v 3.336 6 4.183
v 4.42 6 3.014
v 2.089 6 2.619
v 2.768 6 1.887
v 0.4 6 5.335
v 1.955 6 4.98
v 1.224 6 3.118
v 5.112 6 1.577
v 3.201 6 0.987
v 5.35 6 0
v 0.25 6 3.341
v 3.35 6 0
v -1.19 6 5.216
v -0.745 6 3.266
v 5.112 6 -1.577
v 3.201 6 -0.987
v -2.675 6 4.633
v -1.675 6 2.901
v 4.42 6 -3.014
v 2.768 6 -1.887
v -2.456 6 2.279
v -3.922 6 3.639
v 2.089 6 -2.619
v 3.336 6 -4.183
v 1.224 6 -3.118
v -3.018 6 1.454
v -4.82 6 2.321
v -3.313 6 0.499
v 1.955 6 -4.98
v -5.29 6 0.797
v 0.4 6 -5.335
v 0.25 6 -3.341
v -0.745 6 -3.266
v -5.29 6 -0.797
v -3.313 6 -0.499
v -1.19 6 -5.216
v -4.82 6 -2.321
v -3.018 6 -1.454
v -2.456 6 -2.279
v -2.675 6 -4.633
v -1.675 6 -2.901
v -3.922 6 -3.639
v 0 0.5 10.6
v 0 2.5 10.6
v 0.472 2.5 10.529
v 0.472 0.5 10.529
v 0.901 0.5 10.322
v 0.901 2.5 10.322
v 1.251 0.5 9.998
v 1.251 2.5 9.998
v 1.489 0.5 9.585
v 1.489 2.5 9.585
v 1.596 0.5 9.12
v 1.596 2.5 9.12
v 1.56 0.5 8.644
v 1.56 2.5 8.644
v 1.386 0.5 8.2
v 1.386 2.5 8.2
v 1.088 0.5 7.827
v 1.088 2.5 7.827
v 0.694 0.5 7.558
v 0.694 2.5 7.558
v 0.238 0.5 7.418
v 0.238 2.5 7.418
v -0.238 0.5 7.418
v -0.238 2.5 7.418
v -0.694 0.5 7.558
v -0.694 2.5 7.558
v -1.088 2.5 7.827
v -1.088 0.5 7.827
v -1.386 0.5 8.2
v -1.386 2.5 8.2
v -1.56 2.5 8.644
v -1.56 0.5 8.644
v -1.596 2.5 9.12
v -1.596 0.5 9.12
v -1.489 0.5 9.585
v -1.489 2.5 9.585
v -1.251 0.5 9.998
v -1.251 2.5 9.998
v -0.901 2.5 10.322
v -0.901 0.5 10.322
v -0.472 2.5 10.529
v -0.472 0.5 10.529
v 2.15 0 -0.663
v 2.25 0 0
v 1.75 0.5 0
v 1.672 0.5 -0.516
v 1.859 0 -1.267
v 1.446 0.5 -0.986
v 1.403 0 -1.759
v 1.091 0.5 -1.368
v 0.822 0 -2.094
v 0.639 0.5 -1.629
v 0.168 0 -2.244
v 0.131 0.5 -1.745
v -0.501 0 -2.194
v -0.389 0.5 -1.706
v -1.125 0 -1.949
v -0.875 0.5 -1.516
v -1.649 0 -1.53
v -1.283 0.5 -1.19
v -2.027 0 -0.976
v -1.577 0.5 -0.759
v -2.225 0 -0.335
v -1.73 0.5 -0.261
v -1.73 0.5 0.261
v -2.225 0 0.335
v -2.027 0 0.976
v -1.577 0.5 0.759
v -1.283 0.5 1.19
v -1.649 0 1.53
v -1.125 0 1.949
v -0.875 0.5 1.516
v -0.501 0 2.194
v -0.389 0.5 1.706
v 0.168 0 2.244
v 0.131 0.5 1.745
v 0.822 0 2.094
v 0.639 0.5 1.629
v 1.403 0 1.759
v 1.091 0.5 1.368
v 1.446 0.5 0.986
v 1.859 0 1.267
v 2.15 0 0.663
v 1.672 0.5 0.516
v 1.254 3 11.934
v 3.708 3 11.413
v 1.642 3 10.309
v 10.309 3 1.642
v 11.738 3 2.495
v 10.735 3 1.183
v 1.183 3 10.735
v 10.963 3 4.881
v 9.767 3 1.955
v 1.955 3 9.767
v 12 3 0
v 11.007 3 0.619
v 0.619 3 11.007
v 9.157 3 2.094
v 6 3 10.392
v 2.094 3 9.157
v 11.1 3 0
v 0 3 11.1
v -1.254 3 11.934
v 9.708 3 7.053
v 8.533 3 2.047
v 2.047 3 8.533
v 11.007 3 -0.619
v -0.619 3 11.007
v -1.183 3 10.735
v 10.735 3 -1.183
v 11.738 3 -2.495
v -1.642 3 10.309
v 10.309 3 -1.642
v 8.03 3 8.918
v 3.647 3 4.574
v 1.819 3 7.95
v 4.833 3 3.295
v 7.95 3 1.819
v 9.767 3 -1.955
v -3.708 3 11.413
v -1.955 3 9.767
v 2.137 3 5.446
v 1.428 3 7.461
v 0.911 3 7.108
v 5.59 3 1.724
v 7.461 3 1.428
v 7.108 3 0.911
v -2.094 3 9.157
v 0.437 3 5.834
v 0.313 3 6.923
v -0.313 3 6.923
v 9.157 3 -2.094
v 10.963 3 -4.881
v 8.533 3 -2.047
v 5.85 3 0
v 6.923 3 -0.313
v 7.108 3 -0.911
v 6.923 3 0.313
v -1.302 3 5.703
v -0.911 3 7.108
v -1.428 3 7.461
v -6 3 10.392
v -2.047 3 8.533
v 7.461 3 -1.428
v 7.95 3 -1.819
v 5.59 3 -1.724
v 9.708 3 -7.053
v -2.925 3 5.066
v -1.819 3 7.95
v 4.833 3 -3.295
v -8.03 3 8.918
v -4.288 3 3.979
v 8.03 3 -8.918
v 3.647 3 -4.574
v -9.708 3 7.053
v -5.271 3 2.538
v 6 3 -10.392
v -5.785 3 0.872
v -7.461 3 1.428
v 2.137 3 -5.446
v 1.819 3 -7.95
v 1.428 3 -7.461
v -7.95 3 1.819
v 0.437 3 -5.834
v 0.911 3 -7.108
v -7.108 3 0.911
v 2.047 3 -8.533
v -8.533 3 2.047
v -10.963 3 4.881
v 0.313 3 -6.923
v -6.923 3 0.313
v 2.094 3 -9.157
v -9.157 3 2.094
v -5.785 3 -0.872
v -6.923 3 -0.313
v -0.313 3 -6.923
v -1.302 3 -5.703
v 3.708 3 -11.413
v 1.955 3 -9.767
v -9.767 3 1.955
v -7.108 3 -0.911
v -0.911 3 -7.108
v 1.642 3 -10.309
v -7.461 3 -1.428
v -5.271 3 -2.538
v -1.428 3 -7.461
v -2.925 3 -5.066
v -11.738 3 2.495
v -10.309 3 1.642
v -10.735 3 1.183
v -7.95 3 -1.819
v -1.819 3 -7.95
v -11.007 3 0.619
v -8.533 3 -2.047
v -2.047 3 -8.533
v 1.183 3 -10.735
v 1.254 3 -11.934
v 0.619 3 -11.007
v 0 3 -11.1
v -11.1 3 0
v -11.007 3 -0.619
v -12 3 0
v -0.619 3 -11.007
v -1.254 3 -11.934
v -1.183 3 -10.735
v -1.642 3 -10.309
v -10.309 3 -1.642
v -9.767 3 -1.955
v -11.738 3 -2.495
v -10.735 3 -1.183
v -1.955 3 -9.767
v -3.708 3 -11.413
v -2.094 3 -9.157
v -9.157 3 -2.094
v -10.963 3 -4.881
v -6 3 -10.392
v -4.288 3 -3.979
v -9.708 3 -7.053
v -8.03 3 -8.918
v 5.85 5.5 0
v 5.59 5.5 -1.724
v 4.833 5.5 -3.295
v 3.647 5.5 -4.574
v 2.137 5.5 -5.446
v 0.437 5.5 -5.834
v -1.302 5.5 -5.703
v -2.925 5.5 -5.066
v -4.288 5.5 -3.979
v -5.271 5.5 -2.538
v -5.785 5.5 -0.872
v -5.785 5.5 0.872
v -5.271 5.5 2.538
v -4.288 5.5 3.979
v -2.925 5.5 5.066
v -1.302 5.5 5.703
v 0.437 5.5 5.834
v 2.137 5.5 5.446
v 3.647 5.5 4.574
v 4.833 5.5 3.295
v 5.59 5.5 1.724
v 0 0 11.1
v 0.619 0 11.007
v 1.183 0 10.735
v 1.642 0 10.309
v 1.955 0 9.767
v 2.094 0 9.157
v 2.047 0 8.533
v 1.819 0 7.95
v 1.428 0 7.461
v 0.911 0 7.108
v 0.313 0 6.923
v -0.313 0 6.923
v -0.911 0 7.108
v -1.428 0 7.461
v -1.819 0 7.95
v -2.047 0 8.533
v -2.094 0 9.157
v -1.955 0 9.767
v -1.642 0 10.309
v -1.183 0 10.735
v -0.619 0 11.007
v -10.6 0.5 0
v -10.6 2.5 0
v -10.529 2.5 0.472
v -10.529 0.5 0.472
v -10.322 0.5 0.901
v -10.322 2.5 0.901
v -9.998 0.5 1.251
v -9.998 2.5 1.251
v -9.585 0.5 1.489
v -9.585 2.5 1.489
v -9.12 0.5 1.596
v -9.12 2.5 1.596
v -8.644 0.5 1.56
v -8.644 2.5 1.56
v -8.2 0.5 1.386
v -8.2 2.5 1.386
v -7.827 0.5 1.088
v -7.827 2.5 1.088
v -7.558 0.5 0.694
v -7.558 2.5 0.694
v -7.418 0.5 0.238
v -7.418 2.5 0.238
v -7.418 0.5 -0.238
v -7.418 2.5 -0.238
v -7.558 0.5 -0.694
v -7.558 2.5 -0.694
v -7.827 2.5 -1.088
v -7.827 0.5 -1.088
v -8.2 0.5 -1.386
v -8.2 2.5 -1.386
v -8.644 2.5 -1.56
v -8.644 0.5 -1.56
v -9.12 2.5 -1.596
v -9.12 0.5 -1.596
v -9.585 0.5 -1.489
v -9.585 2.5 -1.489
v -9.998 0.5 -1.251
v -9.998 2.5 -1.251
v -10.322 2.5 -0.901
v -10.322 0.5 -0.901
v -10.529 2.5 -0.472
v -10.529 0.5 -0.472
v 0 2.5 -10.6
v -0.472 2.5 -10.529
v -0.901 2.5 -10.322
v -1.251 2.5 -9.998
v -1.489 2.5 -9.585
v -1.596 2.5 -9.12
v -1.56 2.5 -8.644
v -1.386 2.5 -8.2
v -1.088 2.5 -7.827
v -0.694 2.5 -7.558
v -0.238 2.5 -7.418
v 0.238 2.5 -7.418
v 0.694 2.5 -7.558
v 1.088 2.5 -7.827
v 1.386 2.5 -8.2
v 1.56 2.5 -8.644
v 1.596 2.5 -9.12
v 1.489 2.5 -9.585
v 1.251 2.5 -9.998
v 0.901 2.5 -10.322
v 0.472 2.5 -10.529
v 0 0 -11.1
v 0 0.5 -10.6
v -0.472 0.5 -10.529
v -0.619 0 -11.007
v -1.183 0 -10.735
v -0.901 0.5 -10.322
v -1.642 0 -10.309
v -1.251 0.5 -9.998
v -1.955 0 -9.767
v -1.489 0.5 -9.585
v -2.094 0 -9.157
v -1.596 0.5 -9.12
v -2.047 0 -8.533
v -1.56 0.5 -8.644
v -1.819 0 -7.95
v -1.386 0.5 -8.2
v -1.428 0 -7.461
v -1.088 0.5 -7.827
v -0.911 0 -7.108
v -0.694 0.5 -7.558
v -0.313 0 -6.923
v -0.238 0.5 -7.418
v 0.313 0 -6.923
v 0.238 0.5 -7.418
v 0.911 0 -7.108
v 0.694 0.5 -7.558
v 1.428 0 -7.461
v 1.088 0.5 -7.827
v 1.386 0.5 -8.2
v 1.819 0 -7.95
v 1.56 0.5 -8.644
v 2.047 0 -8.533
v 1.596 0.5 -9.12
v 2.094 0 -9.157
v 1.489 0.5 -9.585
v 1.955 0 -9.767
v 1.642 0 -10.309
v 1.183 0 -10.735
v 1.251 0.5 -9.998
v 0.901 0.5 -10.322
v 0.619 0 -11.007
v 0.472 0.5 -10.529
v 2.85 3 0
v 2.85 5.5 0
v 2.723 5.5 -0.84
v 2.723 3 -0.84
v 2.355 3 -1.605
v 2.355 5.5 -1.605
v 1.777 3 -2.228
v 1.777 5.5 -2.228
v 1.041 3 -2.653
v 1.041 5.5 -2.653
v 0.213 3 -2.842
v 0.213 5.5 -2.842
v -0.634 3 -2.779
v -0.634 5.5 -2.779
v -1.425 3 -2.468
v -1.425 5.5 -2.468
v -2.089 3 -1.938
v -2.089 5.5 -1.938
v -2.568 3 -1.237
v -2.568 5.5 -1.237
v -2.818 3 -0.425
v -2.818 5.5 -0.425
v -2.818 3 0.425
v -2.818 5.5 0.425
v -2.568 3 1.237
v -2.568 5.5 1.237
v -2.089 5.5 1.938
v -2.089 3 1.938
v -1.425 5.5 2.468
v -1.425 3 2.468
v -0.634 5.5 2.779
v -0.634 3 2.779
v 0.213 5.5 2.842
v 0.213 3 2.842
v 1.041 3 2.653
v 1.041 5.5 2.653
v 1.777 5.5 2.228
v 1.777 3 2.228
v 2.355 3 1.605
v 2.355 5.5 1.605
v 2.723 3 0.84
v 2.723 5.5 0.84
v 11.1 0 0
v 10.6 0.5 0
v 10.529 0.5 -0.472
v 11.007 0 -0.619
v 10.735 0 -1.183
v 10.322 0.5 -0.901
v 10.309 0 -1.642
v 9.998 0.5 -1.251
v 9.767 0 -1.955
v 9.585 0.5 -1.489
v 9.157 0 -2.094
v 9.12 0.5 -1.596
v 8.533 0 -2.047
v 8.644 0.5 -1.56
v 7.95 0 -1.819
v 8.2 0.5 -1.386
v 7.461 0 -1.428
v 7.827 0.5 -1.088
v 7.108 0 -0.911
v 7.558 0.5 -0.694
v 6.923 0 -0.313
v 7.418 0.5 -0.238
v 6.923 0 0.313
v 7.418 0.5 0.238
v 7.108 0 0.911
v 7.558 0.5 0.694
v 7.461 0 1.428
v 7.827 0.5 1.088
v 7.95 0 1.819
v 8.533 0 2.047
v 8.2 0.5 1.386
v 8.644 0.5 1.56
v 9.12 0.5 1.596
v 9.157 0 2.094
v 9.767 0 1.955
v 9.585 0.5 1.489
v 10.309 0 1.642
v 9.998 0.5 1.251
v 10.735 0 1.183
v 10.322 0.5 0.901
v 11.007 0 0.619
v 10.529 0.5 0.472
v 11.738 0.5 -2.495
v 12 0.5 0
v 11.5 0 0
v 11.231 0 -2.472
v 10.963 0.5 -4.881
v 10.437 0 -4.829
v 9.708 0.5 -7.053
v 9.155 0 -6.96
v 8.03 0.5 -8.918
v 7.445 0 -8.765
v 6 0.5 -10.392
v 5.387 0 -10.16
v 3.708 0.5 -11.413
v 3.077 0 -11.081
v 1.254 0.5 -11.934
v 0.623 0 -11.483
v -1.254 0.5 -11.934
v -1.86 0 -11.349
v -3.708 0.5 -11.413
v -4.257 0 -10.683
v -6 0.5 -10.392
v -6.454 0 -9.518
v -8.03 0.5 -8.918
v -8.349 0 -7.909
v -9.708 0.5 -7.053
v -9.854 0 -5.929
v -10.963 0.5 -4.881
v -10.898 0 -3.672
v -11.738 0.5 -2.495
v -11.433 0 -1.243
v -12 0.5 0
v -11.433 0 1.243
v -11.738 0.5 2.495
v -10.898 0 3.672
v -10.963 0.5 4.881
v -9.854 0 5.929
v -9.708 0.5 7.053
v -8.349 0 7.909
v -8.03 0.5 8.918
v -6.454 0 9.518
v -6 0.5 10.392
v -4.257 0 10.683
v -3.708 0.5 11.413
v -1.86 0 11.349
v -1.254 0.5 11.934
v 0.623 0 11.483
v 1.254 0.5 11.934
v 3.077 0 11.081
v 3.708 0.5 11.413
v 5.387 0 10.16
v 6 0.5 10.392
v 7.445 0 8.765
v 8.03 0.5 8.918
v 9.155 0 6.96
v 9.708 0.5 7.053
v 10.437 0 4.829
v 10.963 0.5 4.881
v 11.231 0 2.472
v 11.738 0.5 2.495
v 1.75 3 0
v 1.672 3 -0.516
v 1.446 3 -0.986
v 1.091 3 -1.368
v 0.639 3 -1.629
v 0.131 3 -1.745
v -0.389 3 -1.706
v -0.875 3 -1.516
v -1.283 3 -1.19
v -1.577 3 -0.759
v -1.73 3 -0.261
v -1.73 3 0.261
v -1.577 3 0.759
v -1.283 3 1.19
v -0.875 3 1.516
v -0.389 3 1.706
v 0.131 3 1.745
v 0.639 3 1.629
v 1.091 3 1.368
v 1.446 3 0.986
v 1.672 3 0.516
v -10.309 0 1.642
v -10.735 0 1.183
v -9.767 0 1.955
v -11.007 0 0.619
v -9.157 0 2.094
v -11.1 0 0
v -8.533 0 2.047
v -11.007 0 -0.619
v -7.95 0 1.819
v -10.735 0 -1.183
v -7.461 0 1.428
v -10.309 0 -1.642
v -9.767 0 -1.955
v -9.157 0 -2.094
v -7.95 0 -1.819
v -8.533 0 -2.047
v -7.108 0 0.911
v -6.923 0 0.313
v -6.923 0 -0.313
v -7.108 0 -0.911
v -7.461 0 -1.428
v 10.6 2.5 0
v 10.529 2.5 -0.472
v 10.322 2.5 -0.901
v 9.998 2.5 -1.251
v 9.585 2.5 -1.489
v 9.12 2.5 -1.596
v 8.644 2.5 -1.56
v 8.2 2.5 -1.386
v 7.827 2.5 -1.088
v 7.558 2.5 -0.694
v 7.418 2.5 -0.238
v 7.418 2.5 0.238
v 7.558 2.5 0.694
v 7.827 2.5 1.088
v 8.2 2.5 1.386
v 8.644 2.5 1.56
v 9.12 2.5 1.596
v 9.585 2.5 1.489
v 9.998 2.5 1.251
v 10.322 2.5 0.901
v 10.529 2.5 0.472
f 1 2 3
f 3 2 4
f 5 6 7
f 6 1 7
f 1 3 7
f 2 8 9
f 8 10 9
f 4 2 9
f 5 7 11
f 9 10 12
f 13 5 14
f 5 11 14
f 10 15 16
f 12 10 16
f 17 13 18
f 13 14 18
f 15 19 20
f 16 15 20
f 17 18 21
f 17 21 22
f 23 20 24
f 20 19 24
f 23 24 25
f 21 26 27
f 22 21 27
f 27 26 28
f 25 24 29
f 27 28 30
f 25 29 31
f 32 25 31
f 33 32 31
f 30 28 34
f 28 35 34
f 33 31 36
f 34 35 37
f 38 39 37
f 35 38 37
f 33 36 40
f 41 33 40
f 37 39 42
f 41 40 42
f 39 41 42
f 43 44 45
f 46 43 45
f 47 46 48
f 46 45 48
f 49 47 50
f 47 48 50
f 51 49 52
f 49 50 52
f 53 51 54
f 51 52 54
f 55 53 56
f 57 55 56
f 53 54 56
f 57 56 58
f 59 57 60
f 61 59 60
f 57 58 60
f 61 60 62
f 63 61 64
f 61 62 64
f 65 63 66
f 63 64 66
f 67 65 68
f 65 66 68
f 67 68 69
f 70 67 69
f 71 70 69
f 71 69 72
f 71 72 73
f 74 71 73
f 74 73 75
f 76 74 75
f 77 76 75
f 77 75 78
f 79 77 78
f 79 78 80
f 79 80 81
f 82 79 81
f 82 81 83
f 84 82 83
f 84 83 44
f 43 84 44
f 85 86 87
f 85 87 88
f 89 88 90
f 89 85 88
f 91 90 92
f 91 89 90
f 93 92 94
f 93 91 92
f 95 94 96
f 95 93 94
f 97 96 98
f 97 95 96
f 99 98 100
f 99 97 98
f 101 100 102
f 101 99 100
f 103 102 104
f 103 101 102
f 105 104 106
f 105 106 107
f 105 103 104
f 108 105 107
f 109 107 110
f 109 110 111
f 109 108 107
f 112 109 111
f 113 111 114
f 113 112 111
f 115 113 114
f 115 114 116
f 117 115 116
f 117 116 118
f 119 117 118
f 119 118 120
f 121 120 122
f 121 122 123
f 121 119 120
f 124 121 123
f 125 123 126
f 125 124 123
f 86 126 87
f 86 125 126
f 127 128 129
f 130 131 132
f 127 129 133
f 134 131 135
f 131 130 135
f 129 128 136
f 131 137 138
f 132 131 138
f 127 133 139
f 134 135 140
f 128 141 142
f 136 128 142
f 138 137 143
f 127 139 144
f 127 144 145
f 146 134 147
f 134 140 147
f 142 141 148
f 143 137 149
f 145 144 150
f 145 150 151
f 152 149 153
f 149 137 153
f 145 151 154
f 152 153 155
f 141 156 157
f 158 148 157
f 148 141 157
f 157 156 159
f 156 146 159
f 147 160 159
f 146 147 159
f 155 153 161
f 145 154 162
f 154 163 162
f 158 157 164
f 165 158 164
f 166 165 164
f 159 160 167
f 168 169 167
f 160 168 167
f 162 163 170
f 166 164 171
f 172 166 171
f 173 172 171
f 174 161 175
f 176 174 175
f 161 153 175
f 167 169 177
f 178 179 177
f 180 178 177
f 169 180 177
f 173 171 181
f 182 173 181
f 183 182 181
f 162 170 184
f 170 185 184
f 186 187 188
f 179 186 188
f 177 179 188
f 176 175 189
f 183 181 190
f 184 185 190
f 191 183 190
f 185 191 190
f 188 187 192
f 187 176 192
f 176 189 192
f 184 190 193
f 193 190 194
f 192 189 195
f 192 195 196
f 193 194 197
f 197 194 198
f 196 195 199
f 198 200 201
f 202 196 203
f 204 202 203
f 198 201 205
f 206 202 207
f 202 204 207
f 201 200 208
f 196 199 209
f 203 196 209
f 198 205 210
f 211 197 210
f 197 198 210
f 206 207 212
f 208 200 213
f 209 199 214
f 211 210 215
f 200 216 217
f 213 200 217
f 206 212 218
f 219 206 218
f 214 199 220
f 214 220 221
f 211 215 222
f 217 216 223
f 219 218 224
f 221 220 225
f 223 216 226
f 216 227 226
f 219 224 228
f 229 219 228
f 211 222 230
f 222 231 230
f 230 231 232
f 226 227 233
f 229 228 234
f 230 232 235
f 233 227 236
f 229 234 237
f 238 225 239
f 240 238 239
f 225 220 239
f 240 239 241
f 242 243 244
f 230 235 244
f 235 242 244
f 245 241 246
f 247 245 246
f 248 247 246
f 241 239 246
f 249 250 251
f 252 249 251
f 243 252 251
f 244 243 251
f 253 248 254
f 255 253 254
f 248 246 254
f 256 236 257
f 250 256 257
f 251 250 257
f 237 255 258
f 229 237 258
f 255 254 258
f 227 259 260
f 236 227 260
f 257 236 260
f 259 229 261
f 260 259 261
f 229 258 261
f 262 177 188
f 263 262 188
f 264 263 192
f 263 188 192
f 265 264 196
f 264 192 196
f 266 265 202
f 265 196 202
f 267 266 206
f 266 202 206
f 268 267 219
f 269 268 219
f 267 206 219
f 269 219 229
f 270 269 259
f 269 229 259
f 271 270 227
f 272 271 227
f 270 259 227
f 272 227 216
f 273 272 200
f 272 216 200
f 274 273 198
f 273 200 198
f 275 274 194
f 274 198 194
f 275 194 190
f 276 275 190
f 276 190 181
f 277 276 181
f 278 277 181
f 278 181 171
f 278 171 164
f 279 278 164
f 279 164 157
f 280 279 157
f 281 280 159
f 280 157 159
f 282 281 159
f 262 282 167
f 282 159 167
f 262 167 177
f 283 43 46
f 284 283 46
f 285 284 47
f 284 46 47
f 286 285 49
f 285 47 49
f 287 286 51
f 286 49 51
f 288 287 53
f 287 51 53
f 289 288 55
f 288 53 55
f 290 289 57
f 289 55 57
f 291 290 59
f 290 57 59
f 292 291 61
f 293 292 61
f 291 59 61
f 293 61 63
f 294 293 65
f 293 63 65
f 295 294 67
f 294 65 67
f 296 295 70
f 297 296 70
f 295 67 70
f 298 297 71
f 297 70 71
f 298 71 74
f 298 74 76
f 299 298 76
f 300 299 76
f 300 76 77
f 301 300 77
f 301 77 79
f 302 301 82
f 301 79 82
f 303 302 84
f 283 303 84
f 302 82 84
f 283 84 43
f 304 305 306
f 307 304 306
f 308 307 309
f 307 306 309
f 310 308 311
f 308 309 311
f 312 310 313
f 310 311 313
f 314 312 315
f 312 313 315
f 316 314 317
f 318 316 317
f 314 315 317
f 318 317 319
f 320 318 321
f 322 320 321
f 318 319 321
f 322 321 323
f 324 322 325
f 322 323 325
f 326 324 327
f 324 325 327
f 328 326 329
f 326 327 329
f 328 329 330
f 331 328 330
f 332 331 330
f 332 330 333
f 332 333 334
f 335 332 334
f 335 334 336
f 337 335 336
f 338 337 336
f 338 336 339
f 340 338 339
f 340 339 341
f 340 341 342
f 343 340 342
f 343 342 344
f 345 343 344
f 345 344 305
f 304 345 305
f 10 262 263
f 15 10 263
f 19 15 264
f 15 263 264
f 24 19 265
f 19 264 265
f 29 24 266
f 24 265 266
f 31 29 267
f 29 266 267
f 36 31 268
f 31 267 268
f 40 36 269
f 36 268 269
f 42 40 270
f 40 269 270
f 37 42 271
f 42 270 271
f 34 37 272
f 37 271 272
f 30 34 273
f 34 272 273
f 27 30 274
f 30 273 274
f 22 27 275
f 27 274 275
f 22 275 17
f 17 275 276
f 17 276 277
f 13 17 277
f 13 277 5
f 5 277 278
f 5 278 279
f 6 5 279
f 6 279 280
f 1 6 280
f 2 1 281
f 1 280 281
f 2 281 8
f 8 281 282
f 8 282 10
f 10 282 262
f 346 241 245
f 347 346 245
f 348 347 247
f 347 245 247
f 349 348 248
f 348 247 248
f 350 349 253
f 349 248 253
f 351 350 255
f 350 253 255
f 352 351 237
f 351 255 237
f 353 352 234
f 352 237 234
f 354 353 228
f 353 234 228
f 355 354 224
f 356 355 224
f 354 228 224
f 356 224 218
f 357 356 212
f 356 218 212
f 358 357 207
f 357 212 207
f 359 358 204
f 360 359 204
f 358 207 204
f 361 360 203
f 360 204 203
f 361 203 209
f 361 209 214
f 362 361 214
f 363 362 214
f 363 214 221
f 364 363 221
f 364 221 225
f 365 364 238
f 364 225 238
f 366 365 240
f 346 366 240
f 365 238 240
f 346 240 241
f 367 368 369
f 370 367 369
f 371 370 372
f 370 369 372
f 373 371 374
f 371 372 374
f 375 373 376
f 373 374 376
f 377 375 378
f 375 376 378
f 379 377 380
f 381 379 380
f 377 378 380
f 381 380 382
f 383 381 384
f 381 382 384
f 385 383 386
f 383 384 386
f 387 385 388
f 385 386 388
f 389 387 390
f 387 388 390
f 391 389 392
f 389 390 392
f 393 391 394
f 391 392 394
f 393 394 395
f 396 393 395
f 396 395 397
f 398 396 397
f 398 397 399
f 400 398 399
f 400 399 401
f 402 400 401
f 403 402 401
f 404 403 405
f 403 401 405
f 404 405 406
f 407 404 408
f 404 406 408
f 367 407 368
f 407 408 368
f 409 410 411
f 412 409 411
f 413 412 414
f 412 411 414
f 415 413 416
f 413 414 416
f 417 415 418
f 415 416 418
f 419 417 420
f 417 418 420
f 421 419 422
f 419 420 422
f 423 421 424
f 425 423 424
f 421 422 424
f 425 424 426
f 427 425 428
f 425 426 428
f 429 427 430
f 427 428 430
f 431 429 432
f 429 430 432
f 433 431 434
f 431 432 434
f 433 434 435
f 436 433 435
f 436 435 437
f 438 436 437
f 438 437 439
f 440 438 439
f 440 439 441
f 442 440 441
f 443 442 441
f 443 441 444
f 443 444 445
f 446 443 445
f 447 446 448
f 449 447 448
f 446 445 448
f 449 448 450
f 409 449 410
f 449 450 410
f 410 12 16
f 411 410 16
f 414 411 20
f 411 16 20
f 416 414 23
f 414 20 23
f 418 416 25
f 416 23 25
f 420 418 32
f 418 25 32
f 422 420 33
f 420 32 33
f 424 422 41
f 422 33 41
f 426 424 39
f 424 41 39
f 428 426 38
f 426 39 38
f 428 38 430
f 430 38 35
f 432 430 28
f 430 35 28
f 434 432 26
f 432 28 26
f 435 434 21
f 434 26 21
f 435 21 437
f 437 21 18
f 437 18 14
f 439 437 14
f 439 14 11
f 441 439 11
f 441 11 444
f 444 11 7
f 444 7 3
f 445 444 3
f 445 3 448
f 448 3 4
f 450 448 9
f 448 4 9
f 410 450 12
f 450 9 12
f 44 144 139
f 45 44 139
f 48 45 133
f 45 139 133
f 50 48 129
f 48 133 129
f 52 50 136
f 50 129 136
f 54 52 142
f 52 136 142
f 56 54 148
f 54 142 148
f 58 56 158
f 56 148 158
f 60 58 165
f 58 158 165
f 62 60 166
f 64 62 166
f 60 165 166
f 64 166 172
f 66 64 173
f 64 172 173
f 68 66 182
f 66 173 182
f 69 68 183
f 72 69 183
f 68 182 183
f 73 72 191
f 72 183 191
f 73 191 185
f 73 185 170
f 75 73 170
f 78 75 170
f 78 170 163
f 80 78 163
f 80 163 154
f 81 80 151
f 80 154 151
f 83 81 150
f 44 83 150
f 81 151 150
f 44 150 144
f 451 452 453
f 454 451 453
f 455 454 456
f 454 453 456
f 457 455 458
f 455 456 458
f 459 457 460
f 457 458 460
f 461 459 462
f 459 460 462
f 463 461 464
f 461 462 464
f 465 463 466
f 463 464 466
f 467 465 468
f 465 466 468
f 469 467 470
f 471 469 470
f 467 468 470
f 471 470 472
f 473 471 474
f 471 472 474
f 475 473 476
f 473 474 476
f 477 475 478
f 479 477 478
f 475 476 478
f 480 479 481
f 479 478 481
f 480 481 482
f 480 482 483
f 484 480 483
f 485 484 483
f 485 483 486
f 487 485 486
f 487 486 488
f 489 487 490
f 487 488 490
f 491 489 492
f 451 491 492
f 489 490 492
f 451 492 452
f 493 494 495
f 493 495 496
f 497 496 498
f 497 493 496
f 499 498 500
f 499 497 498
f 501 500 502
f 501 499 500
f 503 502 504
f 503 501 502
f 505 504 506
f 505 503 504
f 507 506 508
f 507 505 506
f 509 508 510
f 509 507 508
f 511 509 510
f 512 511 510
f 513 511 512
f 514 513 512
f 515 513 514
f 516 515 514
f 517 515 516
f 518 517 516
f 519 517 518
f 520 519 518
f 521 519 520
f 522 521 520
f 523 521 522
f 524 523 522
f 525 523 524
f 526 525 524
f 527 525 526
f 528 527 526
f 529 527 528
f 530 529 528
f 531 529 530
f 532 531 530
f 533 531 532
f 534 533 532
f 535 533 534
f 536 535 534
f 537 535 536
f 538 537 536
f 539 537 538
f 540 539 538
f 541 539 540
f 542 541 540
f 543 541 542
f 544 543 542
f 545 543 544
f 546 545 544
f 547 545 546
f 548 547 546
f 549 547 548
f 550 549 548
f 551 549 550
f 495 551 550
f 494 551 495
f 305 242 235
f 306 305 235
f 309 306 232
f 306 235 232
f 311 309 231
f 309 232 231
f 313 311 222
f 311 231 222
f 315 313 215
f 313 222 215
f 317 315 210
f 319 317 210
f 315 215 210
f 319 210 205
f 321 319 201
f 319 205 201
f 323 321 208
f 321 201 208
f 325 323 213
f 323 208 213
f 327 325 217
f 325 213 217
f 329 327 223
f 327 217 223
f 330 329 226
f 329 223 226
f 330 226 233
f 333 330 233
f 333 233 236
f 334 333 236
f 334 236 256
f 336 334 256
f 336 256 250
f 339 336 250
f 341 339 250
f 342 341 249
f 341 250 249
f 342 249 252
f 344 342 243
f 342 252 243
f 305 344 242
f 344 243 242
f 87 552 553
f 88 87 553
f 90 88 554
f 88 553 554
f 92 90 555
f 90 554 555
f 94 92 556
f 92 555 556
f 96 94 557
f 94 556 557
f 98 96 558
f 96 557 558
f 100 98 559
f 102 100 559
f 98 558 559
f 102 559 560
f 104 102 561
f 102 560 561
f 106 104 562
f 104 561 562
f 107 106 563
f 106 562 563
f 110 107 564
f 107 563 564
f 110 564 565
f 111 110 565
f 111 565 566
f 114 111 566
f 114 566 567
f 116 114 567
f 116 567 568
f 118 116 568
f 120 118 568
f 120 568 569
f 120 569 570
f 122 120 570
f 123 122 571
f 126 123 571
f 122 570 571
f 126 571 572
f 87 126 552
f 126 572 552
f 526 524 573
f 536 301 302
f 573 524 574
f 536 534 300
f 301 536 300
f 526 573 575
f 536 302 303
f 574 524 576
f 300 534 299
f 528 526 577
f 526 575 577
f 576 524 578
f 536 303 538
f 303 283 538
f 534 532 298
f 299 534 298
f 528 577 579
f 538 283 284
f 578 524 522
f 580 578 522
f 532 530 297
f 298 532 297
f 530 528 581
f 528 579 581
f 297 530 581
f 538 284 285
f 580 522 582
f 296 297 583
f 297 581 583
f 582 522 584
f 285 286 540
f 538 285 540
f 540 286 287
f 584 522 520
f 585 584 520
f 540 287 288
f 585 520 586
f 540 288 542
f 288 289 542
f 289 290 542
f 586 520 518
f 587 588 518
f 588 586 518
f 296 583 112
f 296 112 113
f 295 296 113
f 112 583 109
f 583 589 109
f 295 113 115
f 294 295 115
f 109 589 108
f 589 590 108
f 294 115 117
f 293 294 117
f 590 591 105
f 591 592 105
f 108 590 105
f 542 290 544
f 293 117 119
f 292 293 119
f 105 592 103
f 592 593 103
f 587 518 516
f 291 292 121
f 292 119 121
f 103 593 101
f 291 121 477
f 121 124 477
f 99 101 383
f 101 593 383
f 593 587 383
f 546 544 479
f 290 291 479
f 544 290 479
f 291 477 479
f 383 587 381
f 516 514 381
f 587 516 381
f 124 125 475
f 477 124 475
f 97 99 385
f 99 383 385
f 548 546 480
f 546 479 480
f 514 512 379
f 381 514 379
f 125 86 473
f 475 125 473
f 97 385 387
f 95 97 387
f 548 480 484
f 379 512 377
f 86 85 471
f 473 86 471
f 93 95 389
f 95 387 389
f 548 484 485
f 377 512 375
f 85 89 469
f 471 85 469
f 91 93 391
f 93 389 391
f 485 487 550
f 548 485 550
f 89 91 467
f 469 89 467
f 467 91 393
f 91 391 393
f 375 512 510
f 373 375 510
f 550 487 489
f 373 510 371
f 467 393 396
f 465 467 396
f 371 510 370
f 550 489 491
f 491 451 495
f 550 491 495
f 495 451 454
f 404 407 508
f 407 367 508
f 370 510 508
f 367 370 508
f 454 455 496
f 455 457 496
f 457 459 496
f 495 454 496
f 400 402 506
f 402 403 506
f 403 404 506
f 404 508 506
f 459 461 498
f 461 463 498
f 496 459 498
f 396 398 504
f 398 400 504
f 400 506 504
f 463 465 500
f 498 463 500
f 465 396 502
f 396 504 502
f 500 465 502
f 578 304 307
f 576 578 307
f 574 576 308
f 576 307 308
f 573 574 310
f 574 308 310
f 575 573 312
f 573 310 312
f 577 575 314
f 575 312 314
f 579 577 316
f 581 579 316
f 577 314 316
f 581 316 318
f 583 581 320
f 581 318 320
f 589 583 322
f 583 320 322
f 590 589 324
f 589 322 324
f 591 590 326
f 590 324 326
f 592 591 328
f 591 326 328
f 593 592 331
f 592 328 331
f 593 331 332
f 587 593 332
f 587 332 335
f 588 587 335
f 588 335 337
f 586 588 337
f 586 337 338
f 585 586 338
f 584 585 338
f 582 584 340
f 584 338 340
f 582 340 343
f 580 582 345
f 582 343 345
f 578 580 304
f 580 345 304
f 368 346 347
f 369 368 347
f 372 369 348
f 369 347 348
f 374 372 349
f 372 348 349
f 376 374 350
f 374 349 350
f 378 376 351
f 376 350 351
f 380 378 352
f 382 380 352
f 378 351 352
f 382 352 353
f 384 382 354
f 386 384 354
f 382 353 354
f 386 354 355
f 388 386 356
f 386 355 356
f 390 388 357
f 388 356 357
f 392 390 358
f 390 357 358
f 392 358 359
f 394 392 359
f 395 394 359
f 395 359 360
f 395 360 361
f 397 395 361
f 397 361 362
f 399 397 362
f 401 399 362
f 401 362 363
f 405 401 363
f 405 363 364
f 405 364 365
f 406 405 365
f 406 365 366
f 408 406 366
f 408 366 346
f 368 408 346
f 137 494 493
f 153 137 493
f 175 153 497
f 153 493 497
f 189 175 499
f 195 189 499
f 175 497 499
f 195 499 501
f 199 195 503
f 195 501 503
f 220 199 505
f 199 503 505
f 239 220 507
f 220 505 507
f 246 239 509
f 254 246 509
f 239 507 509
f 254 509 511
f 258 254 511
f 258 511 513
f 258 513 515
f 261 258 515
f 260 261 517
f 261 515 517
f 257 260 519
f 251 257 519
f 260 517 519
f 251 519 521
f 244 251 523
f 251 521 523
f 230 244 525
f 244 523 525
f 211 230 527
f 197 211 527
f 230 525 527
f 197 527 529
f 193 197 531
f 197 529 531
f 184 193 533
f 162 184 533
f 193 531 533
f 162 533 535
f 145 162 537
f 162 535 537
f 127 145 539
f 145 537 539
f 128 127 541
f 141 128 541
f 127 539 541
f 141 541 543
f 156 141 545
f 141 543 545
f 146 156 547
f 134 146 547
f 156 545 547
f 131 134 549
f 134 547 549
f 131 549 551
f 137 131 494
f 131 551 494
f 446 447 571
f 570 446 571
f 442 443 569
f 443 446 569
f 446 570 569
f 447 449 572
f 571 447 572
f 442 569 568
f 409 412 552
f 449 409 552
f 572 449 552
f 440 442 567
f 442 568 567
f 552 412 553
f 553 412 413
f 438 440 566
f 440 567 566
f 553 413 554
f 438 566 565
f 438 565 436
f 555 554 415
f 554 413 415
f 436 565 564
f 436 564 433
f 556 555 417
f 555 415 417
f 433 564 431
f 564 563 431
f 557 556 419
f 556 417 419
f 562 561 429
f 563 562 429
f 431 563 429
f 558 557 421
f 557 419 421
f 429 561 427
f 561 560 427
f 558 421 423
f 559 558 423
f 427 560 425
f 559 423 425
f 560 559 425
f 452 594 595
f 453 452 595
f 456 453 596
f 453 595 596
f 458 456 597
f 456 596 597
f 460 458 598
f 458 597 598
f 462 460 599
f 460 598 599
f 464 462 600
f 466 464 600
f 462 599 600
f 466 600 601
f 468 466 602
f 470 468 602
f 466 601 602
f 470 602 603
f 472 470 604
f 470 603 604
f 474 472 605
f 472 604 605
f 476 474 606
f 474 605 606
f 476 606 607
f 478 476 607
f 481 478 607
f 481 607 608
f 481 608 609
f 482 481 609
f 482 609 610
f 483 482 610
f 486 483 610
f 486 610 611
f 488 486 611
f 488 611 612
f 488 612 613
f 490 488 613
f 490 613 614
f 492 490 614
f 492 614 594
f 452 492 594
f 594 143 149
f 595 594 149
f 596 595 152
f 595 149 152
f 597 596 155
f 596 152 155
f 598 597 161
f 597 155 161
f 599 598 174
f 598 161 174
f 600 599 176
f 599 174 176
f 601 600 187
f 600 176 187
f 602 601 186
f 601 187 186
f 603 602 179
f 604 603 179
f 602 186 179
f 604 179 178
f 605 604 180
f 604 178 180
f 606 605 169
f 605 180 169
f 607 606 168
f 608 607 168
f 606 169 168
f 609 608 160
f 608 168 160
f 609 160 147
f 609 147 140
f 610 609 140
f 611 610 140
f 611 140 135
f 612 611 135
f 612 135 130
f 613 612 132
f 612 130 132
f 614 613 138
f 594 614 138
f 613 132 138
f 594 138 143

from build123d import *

# Parameters (mm, degrees)
SKETCH2_R          = 1.6
CUT_EXTRUDE1_DEPTH = 4
CIRPATTERN1_COUNT  = 4
CHAMFER1_SIZE      = 0.5


with BuildPart() as part:
    # Sketch1 → Revolve1 (revolve)
    with BuildSketch(Plane.XY):
        Polygon((1.75, 0), (1.75, 3), (2.85, 3), (2.85, 6), (5.85, 6), (5.85, 3), (12, 3), (12, 0), align=None)
    revolve(axis=Axis((0, -26.625979541, 0), (0, 1, 0)))

    # Sketch2 → Cut-Extrude1 (cut, through all)
    with BuildSketch(Plane(origin=(0, 3, 0), x_dir=(1, 0, 0), z_dir=(0, 1, 0))):
        with Locations((9, 0)):
            Circle(SKETCH2_R)
    cut_extrude1 = extrude(amount=-CUT_EXTRUDE1_DEPTH, mode=Mode.SUBTRACT)

    # CirPattern1: Cut-Extrude1 ×4 about axis
    cirpattern1_axis = Axis((0, 0, 0), (0, 1, 0))
    for i in range(1, CIRPATTERN1_COUNT):
        add(cut_extrude1.rotate(cirpattern1_axis, i * 360 / CIRPATTERN1_COUNT), mode=Mode.SUBTRACT)

    # Chamfer1
    chamfer1_edges = [part.edges().sort_by_distance(p)[0] for p in [
        (7.4, 0, 0),
        (7.4, 3, 0),
        (0, 0, 7.4),
        (0, 3, 7.4),
        (-7.4, 0, 0),
        (-7.4, 3, 0),
        (0, 0, -7.4),
        (0, 3, -7.4),
        (-12, 0, 0),
        (-5.85, 6, 0),
        (-2.85, 6, 0),
        (-1.75, 0, 0),
    ]]
    chamfer(chamfer1_edges, length=CHAMFER1_SIZE)


solid = part.part
